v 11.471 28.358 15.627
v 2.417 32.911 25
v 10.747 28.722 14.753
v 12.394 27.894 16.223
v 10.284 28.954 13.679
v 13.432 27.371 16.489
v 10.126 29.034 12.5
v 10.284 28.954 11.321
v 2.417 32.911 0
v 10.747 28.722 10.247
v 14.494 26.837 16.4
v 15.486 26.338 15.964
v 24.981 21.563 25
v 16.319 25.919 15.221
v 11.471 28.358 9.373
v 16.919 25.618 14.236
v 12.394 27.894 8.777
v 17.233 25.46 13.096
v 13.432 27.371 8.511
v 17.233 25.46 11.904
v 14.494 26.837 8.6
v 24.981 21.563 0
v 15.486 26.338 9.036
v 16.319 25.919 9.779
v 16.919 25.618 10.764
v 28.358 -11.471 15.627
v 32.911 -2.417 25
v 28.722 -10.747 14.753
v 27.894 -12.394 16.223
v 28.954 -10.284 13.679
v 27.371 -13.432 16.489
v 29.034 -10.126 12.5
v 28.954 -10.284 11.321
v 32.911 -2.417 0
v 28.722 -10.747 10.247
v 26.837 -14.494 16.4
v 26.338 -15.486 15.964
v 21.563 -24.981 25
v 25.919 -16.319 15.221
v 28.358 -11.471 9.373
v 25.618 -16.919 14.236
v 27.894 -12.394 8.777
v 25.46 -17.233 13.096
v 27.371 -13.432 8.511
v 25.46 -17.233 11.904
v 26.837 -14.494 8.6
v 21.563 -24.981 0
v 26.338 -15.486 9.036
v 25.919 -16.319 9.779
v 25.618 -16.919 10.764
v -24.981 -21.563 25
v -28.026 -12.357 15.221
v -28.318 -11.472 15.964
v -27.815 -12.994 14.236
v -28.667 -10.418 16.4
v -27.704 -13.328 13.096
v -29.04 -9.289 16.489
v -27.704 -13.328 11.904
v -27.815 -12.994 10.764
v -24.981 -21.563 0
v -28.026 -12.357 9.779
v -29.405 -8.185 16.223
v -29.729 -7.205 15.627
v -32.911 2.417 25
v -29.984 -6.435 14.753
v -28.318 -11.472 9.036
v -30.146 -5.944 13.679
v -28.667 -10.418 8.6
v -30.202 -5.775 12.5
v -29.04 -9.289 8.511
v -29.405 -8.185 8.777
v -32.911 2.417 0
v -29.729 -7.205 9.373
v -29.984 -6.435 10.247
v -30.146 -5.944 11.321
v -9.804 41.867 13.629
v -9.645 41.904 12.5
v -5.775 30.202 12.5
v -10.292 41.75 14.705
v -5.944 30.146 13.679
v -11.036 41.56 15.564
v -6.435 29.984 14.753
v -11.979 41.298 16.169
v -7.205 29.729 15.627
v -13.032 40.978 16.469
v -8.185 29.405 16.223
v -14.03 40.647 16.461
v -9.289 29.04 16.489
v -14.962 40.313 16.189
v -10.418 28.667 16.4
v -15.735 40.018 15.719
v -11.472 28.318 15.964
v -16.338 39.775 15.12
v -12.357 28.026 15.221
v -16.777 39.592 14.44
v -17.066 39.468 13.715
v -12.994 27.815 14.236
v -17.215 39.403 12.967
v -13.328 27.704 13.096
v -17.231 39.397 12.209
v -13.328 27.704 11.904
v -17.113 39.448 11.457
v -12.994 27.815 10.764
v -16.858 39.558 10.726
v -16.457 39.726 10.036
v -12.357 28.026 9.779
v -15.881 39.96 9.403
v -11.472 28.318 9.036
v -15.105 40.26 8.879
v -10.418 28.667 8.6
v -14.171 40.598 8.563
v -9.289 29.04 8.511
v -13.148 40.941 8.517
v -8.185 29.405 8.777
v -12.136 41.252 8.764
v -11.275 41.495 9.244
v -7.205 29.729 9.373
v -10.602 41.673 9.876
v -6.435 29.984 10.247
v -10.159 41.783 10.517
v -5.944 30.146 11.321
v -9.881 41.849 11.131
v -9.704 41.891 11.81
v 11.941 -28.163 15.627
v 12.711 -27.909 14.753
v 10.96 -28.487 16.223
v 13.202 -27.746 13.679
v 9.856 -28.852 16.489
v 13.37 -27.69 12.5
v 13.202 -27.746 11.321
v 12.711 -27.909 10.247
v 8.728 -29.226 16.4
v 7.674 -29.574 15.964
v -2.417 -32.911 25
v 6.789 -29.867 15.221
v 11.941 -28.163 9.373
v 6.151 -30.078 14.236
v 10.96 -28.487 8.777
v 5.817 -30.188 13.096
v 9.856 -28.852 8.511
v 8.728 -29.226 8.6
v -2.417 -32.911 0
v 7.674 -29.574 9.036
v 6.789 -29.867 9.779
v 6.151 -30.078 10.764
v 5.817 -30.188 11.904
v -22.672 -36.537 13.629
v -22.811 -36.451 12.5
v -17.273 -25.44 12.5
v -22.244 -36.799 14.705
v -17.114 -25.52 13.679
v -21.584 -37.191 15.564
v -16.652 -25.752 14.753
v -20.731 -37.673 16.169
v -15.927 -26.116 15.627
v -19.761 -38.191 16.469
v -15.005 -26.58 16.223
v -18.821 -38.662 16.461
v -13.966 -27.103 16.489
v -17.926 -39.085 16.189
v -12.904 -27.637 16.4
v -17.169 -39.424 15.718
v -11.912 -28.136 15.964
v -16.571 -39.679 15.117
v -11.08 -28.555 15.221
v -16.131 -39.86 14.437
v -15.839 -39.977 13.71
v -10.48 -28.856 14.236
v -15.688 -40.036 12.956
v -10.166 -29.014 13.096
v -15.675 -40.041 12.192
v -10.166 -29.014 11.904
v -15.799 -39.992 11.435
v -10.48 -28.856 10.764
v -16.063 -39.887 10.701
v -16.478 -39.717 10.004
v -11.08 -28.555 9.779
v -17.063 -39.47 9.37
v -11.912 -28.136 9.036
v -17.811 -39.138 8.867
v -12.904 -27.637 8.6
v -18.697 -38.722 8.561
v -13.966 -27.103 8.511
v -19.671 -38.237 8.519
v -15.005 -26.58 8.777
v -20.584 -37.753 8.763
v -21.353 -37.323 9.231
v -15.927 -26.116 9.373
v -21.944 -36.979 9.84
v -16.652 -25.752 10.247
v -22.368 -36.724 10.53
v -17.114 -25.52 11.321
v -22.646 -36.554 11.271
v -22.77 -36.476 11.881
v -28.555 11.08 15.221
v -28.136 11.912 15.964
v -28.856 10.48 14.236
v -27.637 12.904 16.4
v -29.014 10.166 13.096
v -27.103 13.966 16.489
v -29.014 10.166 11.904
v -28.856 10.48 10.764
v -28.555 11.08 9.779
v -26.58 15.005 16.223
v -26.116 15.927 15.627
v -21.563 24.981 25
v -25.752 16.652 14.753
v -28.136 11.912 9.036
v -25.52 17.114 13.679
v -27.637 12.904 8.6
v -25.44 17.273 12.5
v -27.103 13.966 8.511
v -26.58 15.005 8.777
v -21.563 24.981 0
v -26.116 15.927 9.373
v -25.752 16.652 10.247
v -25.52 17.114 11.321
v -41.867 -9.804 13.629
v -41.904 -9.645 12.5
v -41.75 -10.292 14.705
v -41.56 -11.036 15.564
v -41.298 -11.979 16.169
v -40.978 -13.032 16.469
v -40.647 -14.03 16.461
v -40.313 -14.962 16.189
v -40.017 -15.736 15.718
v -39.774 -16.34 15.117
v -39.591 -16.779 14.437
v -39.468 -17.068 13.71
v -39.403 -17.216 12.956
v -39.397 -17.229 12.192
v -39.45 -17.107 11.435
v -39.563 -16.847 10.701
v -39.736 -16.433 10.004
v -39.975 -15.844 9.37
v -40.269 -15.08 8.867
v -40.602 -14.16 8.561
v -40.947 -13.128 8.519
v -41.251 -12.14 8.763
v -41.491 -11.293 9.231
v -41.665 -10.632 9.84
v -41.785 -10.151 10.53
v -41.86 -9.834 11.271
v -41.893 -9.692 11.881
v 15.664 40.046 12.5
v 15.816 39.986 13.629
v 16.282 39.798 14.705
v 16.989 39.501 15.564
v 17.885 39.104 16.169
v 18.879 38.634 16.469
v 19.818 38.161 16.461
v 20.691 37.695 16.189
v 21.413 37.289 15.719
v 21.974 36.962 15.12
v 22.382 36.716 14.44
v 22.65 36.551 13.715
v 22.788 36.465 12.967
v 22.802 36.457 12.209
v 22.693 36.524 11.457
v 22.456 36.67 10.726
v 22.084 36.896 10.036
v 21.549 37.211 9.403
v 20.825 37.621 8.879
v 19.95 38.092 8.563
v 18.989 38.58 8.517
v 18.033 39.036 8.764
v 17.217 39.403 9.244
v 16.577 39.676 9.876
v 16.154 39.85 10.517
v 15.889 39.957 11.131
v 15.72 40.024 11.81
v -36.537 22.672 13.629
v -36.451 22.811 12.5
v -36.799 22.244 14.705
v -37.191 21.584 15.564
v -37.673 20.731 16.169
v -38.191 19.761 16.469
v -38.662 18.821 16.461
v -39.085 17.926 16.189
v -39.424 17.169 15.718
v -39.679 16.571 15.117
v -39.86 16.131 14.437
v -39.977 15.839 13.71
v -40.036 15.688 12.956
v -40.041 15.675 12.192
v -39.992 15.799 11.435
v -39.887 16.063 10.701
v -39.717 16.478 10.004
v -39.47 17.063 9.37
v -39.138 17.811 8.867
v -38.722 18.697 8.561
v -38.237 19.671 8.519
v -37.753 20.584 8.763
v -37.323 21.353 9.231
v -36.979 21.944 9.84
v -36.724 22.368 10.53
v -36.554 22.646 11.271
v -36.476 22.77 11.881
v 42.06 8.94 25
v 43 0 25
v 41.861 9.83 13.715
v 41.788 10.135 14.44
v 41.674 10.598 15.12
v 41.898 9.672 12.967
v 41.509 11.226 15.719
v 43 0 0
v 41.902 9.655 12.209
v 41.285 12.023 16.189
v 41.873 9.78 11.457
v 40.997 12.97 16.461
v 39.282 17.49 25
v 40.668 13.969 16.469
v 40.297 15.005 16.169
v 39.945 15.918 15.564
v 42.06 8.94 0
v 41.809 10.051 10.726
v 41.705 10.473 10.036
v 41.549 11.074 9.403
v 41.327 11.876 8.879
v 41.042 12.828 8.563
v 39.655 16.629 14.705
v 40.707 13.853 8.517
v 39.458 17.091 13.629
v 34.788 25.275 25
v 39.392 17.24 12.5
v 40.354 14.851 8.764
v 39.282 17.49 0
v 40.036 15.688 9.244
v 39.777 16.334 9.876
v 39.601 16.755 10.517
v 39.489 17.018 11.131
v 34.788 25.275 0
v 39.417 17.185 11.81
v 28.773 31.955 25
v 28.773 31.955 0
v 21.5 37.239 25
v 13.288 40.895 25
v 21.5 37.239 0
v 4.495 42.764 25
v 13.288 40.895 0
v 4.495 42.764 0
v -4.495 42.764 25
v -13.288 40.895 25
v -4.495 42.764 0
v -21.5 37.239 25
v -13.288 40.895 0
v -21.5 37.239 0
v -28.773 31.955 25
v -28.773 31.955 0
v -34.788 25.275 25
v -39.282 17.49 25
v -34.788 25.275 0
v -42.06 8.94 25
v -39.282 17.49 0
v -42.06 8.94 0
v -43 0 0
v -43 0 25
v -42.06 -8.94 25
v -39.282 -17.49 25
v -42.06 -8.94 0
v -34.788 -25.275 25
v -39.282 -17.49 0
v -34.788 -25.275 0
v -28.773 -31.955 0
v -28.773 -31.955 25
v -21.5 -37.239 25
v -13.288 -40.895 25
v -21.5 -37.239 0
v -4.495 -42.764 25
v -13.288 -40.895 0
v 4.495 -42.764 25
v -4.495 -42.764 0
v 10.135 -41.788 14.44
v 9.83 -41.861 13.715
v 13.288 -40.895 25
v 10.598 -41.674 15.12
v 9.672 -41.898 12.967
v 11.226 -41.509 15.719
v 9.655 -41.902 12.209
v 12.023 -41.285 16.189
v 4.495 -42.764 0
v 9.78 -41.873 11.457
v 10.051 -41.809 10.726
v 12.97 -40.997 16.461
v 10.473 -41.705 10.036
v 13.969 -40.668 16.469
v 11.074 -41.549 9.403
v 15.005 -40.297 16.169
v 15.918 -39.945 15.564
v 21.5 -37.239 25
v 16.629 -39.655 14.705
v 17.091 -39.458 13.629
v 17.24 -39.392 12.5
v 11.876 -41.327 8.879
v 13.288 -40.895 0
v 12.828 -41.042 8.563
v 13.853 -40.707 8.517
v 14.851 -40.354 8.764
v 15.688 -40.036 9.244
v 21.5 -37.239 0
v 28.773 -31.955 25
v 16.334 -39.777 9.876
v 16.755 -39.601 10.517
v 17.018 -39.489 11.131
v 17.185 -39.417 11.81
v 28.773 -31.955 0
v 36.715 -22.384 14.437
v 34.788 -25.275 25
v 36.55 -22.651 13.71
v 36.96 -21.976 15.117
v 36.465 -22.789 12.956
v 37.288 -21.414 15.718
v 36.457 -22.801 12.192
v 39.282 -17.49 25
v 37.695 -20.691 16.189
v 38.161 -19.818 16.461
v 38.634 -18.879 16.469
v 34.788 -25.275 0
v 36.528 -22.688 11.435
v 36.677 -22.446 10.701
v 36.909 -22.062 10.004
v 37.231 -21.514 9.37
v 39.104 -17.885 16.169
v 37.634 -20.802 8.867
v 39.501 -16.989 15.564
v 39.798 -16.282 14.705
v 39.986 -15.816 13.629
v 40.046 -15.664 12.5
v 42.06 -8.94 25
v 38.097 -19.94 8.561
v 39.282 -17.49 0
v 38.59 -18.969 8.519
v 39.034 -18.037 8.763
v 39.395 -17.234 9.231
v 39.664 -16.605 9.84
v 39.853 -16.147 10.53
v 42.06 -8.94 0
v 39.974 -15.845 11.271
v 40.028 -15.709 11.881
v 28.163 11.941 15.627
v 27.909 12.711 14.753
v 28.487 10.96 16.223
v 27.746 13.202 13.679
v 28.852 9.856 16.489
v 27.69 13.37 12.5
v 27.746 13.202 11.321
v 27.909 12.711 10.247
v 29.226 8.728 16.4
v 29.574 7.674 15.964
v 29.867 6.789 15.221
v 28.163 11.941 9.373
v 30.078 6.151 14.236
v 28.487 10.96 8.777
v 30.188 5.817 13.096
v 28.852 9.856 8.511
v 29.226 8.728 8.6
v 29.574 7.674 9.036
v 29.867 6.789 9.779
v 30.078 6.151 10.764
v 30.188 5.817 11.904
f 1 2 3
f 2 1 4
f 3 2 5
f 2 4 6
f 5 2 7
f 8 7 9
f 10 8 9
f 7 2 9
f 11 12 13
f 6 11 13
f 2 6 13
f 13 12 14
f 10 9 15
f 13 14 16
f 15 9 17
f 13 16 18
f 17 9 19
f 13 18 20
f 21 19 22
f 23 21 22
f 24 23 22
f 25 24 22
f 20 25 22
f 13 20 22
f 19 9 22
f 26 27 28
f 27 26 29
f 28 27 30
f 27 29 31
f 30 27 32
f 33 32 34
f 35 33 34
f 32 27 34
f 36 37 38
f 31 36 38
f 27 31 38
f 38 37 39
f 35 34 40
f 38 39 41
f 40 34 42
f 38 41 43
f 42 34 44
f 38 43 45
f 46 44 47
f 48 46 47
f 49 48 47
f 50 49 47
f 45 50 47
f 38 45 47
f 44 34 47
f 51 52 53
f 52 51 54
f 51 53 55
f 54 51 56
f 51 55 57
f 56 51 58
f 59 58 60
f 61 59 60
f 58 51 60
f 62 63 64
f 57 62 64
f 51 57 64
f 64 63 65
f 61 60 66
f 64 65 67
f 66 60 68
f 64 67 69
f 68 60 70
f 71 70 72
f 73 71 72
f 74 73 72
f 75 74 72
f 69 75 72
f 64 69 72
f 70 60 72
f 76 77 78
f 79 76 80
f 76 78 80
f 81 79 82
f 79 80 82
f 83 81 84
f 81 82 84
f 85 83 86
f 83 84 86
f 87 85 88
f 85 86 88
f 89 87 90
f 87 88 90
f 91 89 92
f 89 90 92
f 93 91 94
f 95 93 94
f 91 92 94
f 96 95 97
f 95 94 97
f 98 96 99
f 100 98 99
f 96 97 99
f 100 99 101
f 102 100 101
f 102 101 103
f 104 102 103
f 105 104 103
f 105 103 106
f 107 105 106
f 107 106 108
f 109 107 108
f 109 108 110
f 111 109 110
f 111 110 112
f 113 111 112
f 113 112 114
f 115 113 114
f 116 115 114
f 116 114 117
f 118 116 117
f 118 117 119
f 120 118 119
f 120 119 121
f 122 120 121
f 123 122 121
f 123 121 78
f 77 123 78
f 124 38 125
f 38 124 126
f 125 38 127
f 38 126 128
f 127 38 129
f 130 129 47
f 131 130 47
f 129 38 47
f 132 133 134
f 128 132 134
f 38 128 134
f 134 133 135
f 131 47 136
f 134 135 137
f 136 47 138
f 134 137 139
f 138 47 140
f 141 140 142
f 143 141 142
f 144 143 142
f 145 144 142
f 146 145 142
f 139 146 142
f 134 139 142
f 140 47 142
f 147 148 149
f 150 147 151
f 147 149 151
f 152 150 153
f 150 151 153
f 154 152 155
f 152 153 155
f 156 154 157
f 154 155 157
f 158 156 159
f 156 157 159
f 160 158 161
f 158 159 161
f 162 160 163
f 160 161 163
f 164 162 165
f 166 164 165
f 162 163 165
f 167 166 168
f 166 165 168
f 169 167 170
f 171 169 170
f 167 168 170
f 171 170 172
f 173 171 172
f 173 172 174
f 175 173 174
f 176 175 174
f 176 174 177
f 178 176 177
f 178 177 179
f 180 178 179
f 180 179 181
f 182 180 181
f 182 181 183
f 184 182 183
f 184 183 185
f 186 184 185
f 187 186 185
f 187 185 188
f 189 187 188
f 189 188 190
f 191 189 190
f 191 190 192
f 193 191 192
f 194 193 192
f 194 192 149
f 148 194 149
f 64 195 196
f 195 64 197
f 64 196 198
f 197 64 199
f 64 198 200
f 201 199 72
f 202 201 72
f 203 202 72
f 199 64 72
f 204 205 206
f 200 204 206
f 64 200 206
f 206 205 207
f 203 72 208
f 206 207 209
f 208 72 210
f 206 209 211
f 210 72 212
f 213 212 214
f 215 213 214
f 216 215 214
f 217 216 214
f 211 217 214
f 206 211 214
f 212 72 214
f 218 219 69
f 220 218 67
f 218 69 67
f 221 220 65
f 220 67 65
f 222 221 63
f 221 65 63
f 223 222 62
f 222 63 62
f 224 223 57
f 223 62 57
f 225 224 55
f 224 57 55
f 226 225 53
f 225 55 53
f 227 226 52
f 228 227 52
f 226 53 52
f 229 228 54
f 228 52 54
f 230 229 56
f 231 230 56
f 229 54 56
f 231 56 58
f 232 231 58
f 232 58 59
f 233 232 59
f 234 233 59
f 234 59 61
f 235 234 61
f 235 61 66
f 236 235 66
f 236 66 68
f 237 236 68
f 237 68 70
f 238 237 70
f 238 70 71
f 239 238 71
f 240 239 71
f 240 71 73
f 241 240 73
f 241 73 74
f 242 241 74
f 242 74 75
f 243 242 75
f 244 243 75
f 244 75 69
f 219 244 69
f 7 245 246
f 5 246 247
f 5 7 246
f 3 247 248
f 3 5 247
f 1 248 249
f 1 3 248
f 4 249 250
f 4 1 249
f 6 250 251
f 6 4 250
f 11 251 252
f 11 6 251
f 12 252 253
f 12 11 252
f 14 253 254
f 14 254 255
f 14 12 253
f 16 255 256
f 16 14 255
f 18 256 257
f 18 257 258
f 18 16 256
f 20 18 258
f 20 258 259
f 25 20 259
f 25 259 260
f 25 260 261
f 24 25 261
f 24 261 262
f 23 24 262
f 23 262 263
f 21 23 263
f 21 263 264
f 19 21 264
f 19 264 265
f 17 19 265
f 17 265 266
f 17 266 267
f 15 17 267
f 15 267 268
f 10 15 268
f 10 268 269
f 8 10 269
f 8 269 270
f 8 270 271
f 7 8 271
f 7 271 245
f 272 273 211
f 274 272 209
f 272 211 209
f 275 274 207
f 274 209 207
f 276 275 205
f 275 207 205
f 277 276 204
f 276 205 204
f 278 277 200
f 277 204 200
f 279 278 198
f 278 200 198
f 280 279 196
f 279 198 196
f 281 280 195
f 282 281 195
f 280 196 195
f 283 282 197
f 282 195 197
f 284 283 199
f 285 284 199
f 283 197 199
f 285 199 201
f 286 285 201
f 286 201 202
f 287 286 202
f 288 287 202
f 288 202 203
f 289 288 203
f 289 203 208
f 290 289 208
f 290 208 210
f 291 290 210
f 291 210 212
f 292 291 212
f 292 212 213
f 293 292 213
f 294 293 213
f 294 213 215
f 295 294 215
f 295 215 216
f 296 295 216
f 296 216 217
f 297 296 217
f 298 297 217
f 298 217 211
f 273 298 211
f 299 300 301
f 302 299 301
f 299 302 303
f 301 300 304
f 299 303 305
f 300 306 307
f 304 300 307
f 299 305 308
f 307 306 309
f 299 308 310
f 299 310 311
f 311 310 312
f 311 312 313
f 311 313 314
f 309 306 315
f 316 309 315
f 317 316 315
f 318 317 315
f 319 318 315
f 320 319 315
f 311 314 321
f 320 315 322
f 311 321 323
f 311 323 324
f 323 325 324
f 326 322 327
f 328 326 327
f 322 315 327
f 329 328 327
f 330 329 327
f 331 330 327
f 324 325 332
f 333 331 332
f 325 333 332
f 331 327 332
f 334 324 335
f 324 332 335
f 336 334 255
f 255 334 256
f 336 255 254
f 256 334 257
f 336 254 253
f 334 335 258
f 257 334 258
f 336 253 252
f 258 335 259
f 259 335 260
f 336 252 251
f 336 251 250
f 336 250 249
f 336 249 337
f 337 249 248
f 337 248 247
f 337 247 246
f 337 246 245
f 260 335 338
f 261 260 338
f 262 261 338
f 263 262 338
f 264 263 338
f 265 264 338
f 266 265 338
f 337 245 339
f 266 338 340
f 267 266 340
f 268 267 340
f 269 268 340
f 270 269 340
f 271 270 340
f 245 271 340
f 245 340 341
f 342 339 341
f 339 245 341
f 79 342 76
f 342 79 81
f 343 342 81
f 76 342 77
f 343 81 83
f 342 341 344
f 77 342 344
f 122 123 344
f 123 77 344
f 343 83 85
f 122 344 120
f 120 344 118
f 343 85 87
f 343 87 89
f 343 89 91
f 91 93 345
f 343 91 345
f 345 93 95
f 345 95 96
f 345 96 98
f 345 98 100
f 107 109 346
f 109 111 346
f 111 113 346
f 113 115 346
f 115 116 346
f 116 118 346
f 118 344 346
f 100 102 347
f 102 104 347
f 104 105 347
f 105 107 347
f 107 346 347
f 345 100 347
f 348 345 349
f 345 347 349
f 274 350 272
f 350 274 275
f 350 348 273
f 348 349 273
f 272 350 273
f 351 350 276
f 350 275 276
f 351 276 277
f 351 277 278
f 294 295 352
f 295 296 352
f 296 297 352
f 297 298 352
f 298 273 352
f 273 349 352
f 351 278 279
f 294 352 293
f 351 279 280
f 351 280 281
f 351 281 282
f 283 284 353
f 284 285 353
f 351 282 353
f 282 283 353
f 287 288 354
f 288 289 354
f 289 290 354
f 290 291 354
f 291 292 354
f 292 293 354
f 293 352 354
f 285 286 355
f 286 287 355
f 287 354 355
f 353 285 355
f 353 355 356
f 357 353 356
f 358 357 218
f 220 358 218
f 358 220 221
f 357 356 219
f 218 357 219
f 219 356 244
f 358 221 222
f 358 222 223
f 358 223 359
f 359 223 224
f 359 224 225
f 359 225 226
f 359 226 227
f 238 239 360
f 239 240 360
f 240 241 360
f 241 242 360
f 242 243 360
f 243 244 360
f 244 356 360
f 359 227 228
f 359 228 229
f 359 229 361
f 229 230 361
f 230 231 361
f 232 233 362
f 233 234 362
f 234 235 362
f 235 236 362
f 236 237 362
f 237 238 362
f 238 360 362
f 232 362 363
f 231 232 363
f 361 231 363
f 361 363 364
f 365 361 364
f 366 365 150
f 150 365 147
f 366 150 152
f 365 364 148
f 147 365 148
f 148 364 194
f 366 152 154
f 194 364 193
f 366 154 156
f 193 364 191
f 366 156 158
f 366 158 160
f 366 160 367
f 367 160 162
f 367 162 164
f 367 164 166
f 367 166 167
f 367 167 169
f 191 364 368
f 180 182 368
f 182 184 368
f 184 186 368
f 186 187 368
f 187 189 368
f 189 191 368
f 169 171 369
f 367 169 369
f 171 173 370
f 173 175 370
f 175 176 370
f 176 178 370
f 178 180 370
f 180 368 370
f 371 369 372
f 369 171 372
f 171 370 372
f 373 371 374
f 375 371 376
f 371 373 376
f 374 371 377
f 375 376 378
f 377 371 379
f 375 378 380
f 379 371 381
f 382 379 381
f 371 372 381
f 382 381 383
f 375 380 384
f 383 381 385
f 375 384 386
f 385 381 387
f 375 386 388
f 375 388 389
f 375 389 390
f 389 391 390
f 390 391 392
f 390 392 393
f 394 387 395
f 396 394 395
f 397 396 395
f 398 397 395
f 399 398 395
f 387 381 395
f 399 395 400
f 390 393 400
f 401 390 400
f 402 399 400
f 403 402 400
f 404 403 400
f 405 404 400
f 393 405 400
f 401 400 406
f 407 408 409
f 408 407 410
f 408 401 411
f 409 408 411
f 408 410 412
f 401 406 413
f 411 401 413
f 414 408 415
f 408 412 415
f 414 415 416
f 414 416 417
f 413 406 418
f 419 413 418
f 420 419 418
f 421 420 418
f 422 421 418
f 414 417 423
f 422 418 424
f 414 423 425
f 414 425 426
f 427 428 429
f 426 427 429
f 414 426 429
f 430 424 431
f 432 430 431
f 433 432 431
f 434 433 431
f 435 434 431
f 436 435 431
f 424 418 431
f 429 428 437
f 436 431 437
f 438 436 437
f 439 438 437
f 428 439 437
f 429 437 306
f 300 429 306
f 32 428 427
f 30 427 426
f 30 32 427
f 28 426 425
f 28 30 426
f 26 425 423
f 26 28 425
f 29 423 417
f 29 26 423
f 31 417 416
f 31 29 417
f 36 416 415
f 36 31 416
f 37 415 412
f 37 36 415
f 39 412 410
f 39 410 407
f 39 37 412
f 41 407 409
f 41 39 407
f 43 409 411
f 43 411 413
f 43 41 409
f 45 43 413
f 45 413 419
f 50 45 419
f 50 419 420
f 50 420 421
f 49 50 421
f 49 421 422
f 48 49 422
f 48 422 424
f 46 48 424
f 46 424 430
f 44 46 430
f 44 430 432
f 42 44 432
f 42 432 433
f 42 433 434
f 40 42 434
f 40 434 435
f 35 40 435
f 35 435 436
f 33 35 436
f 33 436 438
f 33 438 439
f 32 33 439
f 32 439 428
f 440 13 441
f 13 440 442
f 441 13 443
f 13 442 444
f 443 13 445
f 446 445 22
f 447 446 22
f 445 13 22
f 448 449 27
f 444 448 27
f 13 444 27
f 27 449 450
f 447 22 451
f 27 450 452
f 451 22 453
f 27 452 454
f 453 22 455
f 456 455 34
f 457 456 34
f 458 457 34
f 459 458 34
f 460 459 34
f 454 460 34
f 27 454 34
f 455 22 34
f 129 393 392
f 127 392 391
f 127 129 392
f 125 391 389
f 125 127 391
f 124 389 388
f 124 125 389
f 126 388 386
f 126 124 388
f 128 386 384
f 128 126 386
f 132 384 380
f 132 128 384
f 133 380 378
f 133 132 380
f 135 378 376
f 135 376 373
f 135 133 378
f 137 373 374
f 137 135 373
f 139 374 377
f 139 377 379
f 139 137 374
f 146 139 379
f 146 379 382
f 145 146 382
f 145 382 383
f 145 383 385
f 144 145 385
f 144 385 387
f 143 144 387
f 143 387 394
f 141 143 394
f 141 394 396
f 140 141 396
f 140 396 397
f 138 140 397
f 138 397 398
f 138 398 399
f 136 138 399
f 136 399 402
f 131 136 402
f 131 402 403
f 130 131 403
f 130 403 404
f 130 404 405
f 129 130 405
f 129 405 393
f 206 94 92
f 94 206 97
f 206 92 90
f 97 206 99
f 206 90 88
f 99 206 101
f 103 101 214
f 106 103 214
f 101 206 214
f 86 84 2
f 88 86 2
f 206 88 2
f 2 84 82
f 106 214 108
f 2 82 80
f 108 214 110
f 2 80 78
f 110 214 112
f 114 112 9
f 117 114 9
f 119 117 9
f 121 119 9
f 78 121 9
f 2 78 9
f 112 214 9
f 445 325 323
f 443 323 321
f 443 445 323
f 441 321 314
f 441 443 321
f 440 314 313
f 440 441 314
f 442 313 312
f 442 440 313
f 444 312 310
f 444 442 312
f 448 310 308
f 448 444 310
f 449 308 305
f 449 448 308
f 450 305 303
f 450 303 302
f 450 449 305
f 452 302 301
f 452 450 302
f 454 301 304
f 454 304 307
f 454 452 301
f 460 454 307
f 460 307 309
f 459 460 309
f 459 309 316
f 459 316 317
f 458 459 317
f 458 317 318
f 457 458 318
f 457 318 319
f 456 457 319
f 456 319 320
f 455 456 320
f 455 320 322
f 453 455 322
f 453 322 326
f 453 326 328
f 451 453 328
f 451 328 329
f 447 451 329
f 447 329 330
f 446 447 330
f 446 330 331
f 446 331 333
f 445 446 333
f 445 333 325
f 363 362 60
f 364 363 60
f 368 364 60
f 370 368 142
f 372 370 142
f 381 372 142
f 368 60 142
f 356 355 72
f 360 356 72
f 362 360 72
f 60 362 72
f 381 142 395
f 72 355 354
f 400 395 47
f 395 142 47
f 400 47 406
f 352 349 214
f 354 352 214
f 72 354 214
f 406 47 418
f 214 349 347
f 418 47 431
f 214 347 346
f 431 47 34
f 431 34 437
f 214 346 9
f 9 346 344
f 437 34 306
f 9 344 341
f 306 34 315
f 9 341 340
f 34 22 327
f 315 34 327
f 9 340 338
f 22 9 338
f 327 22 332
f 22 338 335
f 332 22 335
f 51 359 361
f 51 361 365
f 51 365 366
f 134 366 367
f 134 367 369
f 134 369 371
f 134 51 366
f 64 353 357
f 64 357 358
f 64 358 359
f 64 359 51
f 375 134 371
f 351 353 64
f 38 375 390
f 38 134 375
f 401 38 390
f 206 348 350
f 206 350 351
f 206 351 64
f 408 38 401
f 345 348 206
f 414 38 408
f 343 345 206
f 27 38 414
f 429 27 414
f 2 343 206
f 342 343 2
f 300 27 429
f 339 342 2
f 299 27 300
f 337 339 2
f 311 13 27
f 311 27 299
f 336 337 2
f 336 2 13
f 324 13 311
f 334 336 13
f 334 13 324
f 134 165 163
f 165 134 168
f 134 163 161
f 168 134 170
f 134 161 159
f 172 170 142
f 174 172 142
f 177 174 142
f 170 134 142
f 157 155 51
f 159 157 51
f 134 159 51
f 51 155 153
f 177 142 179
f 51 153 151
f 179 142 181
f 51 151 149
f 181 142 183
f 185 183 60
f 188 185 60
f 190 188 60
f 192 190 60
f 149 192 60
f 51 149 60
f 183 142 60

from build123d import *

# Parameters (mm, degrees)
F0_R          = 43
F1_DEPTH      = 25
F5_R          = 4
F6_DEPTH      = 20
F6_DEPTH_BACK = 79
F4_R          = 4
F7_DEPTH      = 20
F7_DEPTH_BACK = 80
F3_R          = 4
F8_DEPTH      = 93.1
F8_DEPTH_BACK = 25
F2_R          = 4
F9_DEPTH      = 82.3
F9_DEPTH_BACK = 25


with BuildPart() as f1:
    # F0 (on Top) → F1 (new body)
    with BuildSketch(Plane.XY):
        Circle(F0_R)
        Polygon((-32.9113515503, 2.4172172296), (-21.5626091646, 24.9810705538), (2.4172172296, 32.9113515503), (24.9810705538, 21.5626091646), (32.9113515503, -2.4172172296), (21.5626091646, -24.9810705538), (-2.4172172296, -32.9113515503), (-24.9810705538, -21.5626091646), align=None, mode=Mode.SUBTRACT)
    extrude(amount=F1_DEPTH)

    # F5 (on face) → F6 (cut, two sides)
    with BuildSketch(Plane(origin=(-13.6991438917, -27.2369803574, 0), x_dir=(-0.8933665181, 0.4493286818, 0), z_dir=(0.4493286818, 0.8933665181, 0))) as f6_sk:
        with Locations((0, 12.5)):
            Circle(F5_R)
    extrude(amount=-F6_DEPTH, mode=Mode.SUBTRACT)
    extrude(f6_sk.sketch, amount=F6_DEPTH_BACK, mode=Mode.SUBTRACT)

    # F4 (on face) → F7 (cut, two sides)
    with BuildSketch(Plane(origin=(-28.946211052, -9.5726959675, 0), x_dir=(-0.3139821652, 0.9494288809, 0), z_dir=(0.9494288809, 0.3139821652, 0))) as f7_sk:
        with Locations((0, 12.5)):
            Circle(F4_R)
    extrude(amount=-F7_DEPTH, mode=Mode.SUBTRACT)
    extrude(f7_sk.sketch, amount=F7_DEPTH_BACK, mode=Mode.SUBTRACT)

    # F3 (on face) → F8 (cut, two sides)
    with BuildSketch(Plane(origin=(-27.2369803574, 13.6991438917, 0), x_dir=(0.4493286818, 0.8933665181, 0), z_dir=(0.8933665181, -0.4493286818, 0))) as f8_sk:
        with Locations((0, 12.5)):
            Circle(F3_R)
    extrude(amount=F8_DEPTH, mode=Mode.SUBTRACT)
    extrude(f8_sk.sketch, amount=-F8_DEPTH_BACK, mode=Mode.SUBTRACT)

    # F2 (on face) → F9 (cut, two sides)
    with BuildSketch(Plane(origin=(-9.5726959675, 28.946211052, 0), x_dir=(0.9494288809, 0.3139821652, 0), z_dir=(0.3139821652, -0.9494288809, 0))) as f9_sk:
        with Locations((0, 12.5)):
            Circle(F2_R)
    extrude(amount=F9_DEPTH, mode=Mode.SUBTRACT)
    extrude(f9_sk.sketch, amount=-F9_DEPTH_BACK, mode=Mode.SUBTRACT)


solid = f1.part
